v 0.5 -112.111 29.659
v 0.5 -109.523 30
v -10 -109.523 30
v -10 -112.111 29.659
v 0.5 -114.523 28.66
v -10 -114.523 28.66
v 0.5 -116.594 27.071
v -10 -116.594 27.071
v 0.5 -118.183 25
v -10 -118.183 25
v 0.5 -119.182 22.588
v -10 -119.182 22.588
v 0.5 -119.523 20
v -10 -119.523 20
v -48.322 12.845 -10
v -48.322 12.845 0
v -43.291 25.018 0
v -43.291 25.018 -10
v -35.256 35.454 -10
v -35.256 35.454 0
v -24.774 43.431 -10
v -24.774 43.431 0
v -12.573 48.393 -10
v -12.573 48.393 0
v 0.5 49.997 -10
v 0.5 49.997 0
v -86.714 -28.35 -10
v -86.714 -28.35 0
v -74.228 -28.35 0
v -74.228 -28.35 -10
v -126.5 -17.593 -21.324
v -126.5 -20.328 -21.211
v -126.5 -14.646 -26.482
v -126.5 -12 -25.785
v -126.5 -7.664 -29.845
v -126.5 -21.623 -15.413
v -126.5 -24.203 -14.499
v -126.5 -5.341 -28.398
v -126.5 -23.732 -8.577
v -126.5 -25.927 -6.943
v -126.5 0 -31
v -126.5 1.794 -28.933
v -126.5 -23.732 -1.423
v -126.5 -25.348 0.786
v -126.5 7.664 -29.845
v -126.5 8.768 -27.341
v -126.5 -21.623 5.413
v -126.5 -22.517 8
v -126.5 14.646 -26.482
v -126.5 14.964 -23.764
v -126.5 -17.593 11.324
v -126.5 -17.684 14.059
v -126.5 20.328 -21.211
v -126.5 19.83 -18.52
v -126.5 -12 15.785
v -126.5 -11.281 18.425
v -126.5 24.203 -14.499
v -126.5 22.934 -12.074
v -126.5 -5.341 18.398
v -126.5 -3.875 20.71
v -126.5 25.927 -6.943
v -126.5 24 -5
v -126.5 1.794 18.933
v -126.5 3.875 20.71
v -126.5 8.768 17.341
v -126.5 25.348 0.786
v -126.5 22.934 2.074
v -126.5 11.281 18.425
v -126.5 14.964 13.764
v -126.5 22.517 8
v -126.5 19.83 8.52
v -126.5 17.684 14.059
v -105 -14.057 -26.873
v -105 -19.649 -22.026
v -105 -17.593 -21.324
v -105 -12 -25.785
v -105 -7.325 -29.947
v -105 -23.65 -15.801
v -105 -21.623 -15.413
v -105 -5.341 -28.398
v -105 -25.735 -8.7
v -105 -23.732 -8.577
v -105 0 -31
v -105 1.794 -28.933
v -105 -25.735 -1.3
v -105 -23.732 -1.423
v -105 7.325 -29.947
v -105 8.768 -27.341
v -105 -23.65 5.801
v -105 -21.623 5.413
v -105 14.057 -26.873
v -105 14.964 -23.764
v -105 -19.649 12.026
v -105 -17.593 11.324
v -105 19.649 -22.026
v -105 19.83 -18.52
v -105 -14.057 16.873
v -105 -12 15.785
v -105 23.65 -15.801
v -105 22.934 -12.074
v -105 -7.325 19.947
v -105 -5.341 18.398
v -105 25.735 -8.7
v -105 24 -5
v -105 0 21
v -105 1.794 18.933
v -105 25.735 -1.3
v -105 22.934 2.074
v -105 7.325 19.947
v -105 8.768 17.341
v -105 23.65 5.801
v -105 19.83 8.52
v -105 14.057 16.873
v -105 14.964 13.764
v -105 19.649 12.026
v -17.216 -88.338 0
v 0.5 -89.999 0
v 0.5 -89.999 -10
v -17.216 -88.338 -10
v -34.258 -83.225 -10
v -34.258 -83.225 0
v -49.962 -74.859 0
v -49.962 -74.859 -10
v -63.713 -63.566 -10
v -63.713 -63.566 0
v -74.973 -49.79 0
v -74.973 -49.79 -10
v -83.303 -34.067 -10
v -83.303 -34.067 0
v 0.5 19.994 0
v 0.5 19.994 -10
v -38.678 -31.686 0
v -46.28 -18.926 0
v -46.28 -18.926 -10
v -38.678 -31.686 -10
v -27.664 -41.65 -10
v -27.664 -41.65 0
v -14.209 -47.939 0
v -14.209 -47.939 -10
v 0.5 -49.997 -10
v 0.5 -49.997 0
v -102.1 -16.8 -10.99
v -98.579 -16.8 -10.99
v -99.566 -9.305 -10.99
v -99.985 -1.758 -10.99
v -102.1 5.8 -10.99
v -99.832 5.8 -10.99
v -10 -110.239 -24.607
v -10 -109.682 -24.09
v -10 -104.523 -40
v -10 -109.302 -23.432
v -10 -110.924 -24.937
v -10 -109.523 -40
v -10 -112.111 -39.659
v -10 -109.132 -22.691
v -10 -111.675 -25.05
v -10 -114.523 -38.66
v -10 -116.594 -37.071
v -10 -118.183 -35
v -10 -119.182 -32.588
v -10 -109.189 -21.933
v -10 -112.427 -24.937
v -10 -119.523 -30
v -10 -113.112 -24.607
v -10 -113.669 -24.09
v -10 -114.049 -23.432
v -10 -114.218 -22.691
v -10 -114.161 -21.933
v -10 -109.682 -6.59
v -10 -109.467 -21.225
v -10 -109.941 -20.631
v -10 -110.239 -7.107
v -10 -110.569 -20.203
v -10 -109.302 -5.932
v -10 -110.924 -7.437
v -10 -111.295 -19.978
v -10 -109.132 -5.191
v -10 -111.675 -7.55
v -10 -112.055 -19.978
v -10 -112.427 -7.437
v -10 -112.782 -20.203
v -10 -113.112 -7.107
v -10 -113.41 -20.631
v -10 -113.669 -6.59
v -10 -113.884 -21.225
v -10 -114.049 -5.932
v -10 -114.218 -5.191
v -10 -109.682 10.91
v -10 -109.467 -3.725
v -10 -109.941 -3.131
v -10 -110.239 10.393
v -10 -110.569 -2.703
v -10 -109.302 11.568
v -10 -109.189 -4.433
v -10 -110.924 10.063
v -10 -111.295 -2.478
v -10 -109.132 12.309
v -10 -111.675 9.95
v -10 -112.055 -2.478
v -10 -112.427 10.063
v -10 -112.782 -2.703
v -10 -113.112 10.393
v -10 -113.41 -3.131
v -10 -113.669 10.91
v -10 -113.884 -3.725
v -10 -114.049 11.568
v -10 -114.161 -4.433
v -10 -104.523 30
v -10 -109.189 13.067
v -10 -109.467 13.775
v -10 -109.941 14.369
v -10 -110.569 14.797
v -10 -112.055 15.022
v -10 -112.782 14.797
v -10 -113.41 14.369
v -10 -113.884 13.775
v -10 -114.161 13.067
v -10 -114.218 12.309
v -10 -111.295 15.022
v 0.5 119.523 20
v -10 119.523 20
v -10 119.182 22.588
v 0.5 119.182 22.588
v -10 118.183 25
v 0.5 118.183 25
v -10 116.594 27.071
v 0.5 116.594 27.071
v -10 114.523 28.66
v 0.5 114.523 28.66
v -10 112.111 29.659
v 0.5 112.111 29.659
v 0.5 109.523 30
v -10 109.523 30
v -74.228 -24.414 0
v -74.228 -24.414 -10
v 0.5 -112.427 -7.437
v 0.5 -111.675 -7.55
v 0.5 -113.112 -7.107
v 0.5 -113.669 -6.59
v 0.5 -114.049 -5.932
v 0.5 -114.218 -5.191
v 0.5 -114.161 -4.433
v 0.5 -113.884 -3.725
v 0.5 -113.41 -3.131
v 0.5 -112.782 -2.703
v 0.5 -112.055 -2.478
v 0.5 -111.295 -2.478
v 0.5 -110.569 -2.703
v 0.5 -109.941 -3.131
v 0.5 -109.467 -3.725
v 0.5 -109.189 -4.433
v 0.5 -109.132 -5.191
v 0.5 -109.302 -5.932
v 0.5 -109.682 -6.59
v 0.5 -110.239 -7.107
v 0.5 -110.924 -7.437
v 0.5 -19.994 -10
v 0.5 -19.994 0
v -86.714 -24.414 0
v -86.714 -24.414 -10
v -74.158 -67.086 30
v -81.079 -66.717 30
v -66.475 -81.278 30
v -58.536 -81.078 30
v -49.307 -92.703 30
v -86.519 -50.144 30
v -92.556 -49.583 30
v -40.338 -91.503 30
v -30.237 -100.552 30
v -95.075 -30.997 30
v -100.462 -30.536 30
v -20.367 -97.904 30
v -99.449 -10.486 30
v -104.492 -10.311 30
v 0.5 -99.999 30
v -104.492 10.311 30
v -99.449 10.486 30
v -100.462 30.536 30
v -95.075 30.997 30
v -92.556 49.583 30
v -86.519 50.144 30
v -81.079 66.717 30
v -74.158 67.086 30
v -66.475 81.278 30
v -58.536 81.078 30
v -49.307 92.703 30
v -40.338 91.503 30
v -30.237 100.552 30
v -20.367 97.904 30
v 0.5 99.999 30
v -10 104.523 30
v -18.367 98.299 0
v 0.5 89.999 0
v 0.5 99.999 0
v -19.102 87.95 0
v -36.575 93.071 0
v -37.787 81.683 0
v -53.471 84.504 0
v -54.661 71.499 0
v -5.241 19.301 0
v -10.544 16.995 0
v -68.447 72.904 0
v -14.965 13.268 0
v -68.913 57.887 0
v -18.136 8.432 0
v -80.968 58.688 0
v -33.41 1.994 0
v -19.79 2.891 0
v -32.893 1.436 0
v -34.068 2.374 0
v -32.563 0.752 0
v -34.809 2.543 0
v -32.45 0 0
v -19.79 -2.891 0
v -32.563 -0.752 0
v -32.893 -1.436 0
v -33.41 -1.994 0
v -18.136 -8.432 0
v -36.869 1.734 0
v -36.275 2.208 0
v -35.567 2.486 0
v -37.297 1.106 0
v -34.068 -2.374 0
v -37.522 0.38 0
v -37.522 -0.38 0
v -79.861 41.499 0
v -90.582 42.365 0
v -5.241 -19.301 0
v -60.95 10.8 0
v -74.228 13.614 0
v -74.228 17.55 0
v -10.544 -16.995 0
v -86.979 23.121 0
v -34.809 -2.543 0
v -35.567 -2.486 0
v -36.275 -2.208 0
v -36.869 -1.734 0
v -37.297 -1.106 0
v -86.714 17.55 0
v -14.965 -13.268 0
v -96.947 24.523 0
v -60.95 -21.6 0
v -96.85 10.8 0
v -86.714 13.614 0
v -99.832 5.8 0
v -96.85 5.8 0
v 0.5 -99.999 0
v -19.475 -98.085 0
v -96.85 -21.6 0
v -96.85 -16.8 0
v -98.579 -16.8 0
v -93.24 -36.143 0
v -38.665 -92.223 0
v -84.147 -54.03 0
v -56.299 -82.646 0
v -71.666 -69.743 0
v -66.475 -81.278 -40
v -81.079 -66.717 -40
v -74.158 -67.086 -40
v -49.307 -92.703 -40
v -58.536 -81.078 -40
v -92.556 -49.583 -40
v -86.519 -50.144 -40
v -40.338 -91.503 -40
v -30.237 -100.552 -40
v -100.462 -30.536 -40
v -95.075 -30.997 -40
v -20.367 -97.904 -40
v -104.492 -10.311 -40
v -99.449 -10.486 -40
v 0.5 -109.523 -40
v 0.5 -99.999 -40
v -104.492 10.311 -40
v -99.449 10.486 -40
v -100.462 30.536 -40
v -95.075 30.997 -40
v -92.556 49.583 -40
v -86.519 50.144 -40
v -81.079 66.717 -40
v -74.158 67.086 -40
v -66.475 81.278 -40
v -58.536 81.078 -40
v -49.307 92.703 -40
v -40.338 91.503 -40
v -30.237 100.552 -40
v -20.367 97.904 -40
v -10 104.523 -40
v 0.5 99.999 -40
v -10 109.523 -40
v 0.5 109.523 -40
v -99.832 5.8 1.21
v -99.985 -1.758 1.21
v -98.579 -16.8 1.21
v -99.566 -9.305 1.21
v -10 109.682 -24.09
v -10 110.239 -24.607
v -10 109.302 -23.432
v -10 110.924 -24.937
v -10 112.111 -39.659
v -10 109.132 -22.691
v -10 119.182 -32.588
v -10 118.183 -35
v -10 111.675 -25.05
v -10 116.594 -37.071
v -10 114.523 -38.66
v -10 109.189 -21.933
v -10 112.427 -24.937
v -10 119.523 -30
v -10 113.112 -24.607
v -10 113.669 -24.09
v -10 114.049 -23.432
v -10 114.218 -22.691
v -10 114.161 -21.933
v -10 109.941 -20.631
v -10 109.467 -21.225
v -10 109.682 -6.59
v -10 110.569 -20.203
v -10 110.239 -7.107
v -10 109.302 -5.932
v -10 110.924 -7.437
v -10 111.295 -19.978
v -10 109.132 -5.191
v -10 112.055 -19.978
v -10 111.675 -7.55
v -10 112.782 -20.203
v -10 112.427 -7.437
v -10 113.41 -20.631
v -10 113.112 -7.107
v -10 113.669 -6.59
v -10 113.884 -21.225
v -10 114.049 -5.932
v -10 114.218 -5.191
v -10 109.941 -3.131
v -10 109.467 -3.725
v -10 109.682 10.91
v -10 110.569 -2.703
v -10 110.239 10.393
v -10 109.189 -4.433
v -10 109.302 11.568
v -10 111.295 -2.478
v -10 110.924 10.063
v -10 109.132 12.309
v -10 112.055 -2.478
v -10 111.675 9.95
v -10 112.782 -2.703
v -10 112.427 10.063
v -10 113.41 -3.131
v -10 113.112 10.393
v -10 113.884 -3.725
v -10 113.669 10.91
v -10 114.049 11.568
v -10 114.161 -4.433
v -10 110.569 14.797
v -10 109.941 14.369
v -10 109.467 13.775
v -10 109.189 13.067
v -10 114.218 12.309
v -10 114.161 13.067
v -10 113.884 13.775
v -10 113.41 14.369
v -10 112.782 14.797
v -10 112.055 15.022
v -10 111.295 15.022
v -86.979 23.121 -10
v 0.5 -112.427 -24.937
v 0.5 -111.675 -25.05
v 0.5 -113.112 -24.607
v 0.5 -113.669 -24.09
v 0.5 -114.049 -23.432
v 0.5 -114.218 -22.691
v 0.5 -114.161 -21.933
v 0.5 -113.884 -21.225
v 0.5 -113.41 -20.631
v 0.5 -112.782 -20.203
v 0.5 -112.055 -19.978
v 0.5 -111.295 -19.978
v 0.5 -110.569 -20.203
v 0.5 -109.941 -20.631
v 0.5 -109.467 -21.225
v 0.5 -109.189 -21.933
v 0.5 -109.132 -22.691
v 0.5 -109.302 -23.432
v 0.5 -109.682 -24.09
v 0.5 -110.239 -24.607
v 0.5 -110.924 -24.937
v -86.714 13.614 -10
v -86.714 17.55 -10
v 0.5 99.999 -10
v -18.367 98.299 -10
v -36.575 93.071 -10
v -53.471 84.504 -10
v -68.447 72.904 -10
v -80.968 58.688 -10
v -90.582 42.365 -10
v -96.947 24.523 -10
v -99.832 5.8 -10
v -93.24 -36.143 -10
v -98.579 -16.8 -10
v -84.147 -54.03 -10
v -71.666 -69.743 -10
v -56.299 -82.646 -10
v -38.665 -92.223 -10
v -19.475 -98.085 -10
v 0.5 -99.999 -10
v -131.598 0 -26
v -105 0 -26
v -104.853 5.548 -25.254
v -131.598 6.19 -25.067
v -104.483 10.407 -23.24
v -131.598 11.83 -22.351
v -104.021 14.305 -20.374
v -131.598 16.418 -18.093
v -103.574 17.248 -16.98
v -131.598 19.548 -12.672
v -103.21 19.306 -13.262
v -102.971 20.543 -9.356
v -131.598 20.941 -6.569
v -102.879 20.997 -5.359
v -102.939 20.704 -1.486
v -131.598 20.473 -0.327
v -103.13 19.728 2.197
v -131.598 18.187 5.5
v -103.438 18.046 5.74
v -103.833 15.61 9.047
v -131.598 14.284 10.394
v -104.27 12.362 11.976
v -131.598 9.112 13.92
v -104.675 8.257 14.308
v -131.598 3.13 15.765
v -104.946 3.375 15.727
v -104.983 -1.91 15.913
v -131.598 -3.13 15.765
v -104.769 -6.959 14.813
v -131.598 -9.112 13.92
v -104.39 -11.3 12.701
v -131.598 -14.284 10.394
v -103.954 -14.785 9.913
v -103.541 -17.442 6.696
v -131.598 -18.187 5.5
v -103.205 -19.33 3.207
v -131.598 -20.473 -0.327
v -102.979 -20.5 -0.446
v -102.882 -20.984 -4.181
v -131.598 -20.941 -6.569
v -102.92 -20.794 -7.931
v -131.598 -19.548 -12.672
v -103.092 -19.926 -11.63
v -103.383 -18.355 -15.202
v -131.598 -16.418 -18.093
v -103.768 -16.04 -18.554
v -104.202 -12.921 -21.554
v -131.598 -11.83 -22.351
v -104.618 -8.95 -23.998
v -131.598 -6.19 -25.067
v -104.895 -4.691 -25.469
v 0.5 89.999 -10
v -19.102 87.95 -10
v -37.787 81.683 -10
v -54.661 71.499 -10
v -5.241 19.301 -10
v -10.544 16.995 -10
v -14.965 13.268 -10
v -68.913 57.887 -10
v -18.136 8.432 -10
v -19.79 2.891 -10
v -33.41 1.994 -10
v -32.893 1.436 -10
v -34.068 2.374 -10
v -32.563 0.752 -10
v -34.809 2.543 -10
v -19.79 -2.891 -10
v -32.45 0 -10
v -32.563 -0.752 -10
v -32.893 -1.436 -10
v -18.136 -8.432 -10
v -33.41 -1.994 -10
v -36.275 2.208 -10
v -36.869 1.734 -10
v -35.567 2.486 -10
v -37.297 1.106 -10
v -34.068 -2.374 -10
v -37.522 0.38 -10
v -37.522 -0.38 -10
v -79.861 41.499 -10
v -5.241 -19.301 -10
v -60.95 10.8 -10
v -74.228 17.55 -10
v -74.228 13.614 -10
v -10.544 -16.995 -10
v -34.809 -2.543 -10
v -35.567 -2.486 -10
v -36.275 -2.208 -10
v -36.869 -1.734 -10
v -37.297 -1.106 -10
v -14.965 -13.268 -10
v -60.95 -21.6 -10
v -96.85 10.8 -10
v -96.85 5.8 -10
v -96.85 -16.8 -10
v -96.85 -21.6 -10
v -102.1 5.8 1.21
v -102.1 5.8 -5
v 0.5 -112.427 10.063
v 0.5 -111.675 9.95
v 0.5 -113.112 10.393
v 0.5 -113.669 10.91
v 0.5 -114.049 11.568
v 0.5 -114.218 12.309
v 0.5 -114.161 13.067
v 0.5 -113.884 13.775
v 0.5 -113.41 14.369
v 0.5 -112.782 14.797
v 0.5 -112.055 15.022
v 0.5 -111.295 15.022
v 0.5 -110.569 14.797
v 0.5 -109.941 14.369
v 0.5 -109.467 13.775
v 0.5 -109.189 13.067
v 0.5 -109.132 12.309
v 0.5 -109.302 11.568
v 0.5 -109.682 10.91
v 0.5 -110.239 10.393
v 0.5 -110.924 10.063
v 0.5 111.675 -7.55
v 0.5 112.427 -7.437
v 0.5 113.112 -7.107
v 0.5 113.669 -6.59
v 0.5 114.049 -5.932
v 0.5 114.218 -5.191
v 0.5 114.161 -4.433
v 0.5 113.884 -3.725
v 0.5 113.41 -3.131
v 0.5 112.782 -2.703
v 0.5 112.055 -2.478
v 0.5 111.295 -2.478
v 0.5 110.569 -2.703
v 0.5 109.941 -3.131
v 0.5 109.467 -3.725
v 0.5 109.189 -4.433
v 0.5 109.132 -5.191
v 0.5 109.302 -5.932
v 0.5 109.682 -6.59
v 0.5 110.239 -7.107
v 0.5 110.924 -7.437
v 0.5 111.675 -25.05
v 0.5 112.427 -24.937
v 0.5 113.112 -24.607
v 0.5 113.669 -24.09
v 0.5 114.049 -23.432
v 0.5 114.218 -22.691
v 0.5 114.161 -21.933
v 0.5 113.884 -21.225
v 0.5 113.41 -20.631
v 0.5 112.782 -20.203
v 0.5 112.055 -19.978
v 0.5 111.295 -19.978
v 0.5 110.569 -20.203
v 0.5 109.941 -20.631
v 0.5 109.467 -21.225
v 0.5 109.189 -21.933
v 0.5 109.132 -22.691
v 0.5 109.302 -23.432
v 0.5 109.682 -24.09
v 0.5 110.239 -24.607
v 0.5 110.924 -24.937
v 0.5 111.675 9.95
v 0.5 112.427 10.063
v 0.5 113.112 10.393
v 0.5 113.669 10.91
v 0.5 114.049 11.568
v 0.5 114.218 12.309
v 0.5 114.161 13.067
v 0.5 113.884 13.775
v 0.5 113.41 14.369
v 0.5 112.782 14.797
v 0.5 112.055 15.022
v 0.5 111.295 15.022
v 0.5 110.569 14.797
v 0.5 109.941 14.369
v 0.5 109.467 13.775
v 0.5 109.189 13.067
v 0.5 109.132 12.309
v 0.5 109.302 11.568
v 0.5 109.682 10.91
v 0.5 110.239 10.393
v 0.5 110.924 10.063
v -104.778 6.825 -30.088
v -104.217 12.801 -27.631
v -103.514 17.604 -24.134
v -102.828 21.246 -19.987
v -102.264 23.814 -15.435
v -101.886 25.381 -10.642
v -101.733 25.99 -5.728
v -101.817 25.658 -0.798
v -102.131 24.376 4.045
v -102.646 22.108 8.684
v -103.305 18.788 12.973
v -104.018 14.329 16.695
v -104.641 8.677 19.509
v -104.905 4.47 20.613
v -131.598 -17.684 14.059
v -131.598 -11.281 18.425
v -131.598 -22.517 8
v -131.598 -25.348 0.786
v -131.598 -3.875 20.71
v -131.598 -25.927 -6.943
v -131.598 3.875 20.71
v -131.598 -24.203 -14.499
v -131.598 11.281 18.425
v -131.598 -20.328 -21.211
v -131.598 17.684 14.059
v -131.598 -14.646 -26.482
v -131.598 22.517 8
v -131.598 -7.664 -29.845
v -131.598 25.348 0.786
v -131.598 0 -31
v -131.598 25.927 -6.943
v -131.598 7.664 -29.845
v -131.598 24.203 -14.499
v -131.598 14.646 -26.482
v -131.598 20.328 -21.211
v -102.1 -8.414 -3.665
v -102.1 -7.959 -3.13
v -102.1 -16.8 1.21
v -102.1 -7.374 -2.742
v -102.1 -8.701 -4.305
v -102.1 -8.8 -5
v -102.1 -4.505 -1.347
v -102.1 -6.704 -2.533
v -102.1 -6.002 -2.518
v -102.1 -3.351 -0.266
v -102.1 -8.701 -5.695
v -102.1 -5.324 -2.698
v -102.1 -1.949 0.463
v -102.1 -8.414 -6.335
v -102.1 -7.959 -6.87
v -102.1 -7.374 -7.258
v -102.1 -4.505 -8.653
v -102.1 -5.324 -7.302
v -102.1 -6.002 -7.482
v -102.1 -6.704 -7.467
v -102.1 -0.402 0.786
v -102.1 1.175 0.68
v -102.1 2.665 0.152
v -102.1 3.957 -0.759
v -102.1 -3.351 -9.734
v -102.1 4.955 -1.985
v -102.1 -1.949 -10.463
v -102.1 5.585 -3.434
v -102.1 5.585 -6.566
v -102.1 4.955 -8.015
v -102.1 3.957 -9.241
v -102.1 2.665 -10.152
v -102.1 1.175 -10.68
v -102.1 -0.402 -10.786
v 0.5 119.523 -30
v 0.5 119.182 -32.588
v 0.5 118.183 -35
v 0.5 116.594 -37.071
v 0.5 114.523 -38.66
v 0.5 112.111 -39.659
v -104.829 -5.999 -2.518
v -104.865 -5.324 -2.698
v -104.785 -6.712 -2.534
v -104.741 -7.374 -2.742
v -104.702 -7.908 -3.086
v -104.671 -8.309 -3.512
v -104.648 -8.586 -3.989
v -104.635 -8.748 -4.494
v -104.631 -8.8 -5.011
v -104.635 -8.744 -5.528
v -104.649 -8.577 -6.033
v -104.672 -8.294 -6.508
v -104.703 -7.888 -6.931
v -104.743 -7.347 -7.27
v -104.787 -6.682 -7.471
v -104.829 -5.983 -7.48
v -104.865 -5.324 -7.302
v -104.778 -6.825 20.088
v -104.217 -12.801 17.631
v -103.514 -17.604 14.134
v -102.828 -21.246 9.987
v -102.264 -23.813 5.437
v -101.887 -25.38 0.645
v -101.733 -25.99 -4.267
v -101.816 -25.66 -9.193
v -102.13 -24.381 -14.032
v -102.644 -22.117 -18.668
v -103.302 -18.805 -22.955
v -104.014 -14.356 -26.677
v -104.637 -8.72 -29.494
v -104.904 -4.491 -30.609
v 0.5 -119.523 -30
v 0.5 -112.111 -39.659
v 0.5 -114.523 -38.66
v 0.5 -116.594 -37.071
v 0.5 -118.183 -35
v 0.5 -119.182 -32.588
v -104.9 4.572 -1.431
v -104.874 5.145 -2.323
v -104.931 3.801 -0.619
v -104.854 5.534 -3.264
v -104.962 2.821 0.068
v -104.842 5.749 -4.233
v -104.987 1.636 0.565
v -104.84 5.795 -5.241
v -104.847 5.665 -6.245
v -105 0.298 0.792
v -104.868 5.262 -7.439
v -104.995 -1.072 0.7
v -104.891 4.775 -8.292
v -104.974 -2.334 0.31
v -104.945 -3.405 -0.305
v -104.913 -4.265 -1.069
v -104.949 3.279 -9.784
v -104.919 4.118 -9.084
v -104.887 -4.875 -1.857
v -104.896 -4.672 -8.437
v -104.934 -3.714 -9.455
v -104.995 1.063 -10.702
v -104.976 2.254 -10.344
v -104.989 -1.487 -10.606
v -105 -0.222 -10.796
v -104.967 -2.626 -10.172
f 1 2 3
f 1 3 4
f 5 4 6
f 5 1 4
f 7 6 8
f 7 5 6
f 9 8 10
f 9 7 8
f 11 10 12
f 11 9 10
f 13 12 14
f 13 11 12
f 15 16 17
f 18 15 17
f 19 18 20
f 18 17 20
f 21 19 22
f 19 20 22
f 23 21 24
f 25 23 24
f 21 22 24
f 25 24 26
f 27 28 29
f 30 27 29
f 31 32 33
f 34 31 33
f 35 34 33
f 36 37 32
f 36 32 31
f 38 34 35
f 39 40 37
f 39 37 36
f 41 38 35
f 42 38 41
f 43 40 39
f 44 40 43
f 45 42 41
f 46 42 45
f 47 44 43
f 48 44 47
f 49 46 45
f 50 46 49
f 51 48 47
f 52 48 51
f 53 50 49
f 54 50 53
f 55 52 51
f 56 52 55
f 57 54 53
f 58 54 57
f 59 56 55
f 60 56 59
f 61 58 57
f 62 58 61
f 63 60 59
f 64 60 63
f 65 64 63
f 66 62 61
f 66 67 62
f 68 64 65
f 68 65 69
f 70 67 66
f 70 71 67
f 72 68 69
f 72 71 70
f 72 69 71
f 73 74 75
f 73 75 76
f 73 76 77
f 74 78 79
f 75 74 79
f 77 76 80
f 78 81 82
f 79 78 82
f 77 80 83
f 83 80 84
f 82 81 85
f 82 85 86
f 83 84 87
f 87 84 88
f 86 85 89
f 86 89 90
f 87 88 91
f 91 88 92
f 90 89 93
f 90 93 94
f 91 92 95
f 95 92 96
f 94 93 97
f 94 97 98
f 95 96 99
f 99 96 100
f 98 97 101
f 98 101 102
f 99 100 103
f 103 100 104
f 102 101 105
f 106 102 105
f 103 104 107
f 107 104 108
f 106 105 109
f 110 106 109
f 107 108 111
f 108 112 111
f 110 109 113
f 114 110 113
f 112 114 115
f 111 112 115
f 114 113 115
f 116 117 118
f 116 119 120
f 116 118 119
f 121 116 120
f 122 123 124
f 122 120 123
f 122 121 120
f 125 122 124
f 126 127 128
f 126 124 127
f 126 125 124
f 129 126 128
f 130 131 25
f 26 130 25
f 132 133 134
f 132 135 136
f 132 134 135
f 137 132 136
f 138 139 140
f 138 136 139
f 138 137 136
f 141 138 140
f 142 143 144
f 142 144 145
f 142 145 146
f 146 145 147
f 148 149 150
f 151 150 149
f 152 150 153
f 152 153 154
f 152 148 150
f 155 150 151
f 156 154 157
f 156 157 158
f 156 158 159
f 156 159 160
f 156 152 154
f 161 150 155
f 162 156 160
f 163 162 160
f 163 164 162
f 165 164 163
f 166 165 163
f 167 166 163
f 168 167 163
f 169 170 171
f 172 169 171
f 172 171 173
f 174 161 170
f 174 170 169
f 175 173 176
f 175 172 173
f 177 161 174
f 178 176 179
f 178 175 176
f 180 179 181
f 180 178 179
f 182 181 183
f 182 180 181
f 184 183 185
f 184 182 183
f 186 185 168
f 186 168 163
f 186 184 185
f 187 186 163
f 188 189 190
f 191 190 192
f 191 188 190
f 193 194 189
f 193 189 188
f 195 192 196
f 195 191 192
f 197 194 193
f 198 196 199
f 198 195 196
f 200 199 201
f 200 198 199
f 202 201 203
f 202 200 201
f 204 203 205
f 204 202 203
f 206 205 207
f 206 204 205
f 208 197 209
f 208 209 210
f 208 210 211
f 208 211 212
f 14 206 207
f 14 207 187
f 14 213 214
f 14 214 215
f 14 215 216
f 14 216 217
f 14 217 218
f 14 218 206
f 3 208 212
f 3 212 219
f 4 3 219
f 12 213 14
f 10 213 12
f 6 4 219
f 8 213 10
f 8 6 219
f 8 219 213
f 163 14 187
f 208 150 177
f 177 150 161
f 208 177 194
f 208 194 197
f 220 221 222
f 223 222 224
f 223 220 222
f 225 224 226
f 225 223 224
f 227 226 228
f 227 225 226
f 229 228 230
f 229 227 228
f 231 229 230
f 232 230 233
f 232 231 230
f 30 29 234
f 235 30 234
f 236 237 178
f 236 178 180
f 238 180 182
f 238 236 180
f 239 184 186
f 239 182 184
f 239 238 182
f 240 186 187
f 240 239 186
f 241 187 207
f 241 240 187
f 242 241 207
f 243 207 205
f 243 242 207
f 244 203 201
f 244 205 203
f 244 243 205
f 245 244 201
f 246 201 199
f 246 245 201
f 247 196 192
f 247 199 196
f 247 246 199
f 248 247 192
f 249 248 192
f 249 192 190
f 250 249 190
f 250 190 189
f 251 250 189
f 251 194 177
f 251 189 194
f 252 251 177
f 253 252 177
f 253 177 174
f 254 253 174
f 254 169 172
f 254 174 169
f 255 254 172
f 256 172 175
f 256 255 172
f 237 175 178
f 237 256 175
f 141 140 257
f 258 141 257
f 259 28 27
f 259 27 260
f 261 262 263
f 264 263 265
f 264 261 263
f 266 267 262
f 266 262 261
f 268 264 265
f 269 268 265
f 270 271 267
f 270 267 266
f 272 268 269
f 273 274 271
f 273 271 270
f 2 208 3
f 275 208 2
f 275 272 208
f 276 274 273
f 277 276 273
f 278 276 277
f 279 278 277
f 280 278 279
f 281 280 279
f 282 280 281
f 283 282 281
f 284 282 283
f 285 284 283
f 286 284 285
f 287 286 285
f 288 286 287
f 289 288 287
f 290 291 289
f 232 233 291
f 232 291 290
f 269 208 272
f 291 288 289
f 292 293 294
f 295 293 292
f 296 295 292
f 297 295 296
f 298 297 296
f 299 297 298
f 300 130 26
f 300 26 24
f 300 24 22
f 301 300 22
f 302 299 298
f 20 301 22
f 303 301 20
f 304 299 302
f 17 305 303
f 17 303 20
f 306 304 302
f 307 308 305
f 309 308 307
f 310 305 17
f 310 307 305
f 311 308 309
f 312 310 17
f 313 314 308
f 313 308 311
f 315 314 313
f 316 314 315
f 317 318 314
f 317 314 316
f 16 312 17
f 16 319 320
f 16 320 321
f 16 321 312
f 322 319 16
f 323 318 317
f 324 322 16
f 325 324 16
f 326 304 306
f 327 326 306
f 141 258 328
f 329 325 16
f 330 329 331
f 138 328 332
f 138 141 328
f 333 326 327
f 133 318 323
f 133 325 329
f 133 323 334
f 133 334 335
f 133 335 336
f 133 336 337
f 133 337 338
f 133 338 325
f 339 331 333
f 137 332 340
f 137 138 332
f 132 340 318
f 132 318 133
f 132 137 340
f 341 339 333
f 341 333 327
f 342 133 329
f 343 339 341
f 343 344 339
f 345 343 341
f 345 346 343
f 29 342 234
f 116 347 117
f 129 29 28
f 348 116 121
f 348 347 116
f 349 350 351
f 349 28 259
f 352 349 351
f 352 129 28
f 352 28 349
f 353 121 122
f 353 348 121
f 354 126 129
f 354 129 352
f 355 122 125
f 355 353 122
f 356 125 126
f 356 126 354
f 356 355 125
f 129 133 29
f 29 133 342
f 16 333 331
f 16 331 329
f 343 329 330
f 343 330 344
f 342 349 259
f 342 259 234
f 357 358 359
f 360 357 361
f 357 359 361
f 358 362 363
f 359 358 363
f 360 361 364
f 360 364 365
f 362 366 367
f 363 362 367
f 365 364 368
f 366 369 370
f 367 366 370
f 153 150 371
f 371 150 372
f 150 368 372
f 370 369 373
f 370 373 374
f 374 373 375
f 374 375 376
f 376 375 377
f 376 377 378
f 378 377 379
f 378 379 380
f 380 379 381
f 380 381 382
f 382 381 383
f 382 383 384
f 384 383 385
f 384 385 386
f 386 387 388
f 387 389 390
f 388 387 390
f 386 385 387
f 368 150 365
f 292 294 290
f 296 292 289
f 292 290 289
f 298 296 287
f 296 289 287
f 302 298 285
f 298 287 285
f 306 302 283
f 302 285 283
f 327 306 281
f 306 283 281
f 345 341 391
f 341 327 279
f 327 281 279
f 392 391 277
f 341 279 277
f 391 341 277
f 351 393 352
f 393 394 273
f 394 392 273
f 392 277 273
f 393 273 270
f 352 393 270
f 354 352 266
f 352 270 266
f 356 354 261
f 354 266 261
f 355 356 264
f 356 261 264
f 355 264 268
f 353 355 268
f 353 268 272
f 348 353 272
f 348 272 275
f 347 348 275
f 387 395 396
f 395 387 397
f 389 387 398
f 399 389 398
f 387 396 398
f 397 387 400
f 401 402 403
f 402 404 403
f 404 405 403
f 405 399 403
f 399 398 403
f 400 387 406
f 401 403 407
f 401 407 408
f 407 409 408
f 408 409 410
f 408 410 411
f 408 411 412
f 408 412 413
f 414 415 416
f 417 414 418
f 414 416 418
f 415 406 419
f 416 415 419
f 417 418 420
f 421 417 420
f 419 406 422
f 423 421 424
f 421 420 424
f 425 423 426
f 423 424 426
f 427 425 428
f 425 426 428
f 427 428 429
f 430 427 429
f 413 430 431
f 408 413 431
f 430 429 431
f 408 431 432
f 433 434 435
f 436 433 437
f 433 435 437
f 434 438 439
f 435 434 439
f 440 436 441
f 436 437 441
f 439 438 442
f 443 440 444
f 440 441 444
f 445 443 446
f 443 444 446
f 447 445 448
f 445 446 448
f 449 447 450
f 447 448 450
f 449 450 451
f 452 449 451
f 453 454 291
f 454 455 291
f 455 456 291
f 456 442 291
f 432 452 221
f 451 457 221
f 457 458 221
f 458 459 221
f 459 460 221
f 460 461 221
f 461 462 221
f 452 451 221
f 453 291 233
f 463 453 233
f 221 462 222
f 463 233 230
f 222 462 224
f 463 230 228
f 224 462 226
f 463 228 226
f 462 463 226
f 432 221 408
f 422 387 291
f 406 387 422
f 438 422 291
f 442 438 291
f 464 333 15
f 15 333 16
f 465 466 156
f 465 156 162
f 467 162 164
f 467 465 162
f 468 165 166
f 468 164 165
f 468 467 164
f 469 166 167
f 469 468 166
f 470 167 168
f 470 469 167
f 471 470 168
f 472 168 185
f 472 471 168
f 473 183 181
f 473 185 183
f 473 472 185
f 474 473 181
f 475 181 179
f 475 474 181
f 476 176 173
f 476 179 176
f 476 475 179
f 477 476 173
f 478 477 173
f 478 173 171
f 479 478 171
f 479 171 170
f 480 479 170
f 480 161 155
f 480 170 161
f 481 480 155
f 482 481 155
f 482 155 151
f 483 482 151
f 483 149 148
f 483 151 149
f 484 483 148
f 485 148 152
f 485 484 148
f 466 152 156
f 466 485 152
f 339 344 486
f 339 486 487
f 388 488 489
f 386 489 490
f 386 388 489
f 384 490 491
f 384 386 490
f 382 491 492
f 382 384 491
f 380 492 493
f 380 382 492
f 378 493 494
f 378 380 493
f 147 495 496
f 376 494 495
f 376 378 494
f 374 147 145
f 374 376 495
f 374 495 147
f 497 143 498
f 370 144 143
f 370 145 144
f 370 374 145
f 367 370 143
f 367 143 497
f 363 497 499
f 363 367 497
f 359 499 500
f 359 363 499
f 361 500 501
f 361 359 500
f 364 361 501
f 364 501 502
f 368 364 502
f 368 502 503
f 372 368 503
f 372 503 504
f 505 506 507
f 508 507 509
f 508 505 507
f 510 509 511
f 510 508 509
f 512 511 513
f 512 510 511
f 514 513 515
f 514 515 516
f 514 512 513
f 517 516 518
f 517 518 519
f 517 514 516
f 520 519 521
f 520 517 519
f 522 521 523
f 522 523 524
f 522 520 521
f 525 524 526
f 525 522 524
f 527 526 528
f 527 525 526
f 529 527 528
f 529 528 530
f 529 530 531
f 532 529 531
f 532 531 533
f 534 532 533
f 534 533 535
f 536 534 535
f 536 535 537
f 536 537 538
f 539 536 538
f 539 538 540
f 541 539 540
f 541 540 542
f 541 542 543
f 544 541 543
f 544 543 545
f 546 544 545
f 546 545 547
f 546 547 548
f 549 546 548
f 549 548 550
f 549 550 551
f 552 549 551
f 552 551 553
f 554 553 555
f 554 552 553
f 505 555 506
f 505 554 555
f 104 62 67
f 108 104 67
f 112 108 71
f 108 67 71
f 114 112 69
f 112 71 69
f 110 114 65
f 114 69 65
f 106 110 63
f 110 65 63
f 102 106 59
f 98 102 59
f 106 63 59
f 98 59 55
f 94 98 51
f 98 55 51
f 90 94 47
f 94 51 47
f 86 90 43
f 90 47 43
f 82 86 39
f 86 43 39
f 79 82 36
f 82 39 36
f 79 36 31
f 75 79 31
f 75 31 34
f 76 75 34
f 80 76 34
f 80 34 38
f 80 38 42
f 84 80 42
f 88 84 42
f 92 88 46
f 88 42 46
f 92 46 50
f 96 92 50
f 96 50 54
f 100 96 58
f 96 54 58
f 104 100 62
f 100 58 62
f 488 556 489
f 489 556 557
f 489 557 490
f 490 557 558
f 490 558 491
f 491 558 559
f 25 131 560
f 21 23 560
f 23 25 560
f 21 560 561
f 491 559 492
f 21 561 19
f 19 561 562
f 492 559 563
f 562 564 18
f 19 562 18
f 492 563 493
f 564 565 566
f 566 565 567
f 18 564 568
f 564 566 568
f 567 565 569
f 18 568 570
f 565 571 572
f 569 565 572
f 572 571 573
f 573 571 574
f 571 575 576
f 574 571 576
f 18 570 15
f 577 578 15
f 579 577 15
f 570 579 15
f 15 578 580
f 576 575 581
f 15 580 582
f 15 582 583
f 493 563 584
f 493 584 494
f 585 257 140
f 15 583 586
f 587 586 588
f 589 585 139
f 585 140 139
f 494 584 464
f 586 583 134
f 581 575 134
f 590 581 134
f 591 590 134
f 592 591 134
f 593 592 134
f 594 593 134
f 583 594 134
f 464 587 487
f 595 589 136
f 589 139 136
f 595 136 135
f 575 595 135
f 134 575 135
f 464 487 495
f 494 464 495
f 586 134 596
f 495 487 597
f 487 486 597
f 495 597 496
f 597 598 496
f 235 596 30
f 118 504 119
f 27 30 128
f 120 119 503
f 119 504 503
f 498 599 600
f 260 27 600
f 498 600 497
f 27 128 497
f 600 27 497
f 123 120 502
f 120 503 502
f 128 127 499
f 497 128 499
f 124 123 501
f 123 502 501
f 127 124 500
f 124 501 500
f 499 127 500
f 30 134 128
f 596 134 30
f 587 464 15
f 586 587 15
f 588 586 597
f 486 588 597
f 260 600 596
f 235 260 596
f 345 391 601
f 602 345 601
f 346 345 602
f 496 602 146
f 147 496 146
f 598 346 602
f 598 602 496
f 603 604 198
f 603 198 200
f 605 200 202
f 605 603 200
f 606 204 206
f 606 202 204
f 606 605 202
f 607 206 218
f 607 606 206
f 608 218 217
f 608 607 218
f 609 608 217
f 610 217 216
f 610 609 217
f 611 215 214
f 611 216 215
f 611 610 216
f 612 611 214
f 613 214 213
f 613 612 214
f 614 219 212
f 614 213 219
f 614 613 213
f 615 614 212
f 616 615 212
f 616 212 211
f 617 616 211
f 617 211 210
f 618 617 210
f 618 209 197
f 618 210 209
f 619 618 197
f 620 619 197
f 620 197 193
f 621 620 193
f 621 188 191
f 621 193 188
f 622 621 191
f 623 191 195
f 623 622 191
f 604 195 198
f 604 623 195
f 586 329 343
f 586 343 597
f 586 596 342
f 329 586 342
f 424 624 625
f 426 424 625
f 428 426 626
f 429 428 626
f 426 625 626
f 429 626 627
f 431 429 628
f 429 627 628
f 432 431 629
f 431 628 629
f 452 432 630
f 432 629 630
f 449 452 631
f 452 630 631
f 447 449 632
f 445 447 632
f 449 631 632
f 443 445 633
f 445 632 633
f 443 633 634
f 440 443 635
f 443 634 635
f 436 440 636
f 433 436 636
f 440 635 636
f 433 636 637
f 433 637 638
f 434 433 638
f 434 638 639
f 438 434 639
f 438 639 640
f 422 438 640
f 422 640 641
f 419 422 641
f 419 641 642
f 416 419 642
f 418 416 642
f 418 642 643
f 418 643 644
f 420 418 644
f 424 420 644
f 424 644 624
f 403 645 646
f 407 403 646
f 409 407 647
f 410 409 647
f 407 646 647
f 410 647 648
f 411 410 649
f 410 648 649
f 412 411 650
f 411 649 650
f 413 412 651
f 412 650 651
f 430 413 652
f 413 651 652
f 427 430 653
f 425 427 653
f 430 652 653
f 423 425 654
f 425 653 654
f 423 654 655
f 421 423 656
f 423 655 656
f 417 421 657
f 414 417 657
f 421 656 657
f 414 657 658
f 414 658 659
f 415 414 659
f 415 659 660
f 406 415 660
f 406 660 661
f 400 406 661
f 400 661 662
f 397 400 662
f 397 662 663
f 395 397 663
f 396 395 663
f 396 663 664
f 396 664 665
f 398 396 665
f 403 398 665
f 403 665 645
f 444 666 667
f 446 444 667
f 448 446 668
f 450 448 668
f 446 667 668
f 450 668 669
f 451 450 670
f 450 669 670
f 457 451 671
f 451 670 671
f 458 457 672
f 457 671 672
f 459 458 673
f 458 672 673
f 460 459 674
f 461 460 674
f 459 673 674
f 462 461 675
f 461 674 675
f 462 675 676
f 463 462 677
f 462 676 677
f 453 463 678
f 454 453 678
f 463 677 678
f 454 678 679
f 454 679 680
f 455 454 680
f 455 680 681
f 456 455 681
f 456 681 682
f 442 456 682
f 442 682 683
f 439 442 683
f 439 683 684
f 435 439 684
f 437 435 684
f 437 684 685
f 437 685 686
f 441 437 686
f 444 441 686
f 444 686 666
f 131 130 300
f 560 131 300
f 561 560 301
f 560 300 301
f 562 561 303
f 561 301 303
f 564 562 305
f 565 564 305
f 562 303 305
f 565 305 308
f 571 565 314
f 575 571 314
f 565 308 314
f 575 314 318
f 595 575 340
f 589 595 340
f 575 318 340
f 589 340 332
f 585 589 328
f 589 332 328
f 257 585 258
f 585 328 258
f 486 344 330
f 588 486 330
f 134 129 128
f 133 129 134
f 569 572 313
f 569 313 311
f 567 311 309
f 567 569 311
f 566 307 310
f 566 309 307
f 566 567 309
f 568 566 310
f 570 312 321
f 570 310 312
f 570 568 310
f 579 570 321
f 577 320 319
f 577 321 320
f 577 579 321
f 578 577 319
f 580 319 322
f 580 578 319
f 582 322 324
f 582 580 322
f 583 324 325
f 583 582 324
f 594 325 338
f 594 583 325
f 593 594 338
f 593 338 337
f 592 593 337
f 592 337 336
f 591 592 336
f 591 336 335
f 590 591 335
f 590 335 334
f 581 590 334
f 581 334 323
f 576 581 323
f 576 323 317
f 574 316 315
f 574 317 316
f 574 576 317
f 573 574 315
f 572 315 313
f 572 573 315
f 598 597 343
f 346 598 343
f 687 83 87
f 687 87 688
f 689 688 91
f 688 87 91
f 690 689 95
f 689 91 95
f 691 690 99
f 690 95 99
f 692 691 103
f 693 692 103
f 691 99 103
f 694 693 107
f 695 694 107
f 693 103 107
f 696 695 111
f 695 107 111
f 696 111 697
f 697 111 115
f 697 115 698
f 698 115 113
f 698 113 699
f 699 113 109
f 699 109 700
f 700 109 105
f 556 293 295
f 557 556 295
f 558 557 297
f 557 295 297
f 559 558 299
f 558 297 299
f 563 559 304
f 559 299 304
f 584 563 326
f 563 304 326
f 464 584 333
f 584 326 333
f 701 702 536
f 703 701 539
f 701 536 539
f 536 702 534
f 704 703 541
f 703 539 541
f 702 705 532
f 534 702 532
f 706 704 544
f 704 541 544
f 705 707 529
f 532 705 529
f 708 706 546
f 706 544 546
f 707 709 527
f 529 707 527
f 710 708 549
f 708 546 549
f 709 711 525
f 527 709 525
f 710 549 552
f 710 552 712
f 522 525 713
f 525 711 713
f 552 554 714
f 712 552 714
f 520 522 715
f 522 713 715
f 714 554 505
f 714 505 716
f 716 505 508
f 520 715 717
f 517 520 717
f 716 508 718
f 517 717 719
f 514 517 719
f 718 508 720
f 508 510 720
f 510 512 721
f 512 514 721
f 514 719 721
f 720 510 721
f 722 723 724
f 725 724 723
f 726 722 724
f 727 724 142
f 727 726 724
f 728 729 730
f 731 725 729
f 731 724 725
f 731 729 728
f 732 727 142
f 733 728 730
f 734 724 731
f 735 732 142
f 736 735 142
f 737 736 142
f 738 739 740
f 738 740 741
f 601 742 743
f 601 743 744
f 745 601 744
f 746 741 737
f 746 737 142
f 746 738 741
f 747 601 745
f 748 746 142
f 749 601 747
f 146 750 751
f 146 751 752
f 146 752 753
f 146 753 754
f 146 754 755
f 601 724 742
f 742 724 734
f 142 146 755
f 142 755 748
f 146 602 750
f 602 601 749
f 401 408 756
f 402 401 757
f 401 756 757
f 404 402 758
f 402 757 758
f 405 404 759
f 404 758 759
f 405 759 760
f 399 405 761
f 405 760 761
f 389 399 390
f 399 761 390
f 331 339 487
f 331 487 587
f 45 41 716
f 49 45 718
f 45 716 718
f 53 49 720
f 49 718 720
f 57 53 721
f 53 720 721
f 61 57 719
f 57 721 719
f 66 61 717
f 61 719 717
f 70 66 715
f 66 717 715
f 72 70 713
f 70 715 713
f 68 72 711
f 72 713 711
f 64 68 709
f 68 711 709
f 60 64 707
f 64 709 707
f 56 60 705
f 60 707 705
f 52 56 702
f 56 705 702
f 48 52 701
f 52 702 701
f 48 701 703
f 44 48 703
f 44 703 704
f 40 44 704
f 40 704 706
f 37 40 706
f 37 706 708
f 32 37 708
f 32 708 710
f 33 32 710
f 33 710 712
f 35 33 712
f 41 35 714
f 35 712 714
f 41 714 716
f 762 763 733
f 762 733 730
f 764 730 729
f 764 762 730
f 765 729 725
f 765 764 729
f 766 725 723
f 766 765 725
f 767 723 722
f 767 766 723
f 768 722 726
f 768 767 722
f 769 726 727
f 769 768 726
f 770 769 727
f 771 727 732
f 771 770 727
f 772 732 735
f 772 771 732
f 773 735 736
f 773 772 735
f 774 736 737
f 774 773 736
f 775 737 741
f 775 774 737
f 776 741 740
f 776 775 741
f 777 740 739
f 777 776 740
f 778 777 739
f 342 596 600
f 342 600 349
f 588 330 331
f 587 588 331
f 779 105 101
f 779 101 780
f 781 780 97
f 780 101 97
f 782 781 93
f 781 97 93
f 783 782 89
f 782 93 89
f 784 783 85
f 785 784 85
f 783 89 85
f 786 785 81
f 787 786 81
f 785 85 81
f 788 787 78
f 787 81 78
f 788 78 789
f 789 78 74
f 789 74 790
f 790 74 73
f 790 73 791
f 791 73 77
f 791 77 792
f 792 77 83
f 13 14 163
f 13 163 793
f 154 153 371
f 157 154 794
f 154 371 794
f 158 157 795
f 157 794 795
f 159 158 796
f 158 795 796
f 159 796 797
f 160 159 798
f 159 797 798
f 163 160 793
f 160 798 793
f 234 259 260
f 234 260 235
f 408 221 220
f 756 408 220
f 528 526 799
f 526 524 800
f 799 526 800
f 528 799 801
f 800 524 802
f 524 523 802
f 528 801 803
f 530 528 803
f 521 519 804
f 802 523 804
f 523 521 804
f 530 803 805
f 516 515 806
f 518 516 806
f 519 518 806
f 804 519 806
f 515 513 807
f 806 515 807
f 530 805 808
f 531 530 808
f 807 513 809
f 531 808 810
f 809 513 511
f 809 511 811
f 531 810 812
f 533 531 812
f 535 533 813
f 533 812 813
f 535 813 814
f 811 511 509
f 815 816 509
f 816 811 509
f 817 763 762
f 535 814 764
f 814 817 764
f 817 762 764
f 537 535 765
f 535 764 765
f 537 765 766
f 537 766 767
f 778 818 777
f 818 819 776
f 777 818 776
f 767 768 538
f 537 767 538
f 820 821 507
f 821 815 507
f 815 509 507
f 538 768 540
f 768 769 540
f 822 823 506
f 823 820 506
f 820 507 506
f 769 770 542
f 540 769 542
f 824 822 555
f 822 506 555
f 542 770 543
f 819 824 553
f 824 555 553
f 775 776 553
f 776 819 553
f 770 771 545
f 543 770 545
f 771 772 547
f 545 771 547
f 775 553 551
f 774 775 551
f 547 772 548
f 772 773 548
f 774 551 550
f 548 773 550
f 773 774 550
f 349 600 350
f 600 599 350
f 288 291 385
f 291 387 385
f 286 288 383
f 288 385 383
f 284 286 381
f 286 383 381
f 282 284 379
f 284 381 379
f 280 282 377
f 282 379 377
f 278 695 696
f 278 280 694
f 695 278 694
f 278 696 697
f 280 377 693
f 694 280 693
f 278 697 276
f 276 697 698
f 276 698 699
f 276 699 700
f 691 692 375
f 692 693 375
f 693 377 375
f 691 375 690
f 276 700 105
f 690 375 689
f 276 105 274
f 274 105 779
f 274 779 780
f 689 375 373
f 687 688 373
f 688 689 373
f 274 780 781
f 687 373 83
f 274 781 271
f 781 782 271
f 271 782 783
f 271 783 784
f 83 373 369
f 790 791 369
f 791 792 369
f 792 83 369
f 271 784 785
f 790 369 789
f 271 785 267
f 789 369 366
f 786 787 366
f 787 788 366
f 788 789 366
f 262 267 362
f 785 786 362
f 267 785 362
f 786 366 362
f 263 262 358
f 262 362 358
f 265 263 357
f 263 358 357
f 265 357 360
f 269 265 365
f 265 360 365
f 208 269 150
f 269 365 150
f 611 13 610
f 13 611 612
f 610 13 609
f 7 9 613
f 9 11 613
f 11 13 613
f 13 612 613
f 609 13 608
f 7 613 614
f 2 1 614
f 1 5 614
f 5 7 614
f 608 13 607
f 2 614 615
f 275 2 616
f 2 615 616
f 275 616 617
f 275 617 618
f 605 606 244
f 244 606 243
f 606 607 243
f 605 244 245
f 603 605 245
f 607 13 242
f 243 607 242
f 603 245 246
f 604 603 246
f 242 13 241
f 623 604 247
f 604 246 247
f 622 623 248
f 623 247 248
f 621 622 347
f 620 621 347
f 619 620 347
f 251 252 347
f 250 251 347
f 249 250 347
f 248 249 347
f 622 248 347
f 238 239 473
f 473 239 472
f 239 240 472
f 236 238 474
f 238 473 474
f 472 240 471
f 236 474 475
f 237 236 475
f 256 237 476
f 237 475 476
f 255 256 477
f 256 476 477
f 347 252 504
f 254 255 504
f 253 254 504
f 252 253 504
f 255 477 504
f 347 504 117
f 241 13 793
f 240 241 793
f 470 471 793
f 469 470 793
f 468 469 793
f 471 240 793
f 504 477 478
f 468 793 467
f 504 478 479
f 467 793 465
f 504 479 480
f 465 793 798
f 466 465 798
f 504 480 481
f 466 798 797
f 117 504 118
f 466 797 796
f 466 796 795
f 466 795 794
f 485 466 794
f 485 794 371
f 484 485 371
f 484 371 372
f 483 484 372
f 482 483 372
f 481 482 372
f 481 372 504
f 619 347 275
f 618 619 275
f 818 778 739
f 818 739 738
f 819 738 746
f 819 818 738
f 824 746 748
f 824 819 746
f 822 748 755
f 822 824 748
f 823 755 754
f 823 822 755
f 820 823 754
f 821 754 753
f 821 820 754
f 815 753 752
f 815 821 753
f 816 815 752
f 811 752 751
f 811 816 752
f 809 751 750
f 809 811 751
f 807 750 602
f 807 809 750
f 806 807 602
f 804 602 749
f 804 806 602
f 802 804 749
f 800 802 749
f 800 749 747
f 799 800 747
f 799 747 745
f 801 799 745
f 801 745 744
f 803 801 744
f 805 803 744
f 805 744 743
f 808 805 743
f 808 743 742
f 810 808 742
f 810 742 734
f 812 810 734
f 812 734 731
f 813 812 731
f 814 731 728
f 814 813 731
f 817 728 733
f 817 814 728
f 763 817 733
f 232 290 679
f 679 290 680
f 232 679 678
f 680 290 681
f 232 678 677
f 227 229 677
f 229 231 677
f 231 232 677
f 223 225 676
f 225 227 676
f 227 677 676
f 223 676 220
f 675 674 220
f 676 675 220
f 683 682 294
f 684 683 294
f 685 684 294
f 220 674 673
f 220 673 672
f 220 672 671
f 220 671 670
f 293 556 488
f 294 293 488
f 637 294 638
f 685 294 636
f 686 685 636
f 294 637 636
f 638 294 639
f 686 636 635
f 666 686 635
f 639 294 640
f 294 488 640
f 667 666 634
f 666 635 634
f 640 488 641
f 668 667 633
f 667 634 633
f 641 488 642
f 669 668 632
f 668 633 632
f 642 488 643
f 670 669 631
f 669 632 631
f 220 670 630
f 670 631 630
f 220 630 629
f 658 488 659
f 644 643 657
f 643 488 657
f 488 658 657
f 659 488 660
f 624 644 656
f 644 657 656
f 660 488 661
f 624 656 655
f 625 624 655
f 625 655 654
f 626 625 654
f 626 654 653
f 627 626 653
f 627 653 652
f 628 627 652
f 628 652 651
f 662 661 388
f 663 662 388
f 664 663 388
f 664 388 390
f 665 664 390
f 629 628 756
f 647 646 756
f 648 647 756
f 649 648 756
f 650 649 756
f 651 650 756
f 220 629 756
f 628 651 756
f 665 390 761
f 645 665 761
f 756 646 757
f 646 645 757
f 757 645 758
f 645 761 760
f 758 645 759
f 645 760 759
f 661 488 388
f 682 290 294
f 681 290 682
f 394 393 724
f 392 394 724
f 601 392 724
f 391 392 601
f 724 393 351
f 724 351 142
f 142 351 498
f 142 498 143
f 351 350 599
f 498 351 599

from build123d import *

# Parameters (mm, degrees)
SKETCH_1_W                = 105
SKETCH_1_H                = 10
EXTRUDE_3_DEPTH           = 10
EXTRUDE_3_DEPTH_BACK      = 20
SKETCH_11_R               = 105
SKETCH_11_R_2             = 100
EXTRUDE_START             = 20
SKETCH_12_R               = 105
SKETCH_12_R_2             = 100
EXTRUDE_4_DEPTH           = 20
SKETCH_4_R                = 25.5
SKETCH_4_R_2              = 20.5
EXTRUDE_6_DEPTH           = 20
EXTRUDE_START_2           = -31.598350223
EXTRUDE_7_OUTLINE_R       = 26
EXTRUDE_7_OUTLINE_R_2     = 21
EXTRUDE_7_DEPTH           = 30.598350223
SKETCH_6_R                = 20
CUT_EXTRUDE_1_DEPTH       = 174.040821302
CUT_EXTRUDE_8_DEPTH       = 10
CUT_EXTRUDE_START         = -4.05
SKETCH_17_W               = 12.2
SKETCH_17_H               = 22.6
CUT_EXTRUDE_9_DEPTH       = 6.15
CUT_EXTRUDE_START_2       = -35
CUT_EXTRUDE_10_DEPTH      = 35.9
SKETCH_21_W               = 12.48598734
SKETCH_21_H               = 3.935393954
CUT_EXTRUDE_11_DEPTH      = 174.040821302
SKETCH_23_W               = 21.5
SKETCH_23_H               = 4
MIRROR_START              = -126.5
MIRROR_3_OUTLINE_R        = 26
MIRROR_3_OUTLINE_R_2      = 24
MIRROR_3_DEPTH            = 21.5
SKETCH_24_R               = 20
CUT_EXTRUDE_12_DEPTH      = 174.040821302
SKETCH_25_W               = 5.25
SKETCH_25_H               = 10
CUT_EXTRUDE_13_DEPTH      = 1
EXTRUDE_8_DEPTH           = 35
FILLET_1_R                = 10
FILLET_1_OF_MIRROR_4_R    = 10
M5X0_8_1_D                = 4.2
SKETCH_38_R               = 2.55
CUT_EXTRUDE_17_DEPTH      = 190.567335177
M5X0_8_2_D                = 4.2
CUT_EXTRUDE_18_DEPTH      = 183.219119633
CUT_EXTRUDE_18_DEPTH_BACK = 183.219119633
SKETCH_39_R               = 2.55
CUT_EXTRUDE_14_DEPTH      = 183.219119633
CUT_EXTRUDE_14_DEPTH_BACK = 183.219119633
SKETCH_34_W               = 208.658629851
SKETCH_34_H               = 276.195432186


with BuildPart() as part:
    # 草图1 → 旋转1 (revolve)
    with BuildSketch(Plane(origin=(0, 0, 0), x_dir=(1, 0, 0), z_dir=(0, 1, 0))):
        with Locations((52.5, 5)):
            Rectangle(SKETCH_1_W, SKETCH_1_H)
    revolve(axis=Axis((0, 0, 0), (0, 0, -1)))

    # 草图11 → 凸台-拉伸3 (add, two sides: drawn at the far end of the back side and taken through both)
    with BuildSketch(Plane.XY.offset(-EXTRUDE_3_DEPTH_BACK)):
        Circle(SKETCH_11_R)
        Circle(SKETCH_11_R_2, mode=Mode.SUBTRACT)
    extrude(amount=EXTRUDE_3_DEPTH + EXTRUDE_3_DEPTH_BACK)

    # 草图12 → 凸台-拉伸4 (add)
    with BuildSketch(Plane.XY.offset(10).offset(EXTRUDE_START)):
        Circle(SKETCH_12_R)
        Circle(SKETCH_12_R_2, mode=Mode.SUBTRACT)
    extrude_4 = extrude(amount=-EXTRUDE_4_DEPTH)

    # 镜向1: 凸台-拉伸4 across plane
    add(extrude_4.mirror(Plane.XY.offset(-5)))

    # 草图4 → 凸台-拉伸6 (add)
    with BuildSketch(Plane(origin=(100, 0, 0), x_dir=(0, 0, -1), z_dir=(1, 0, 0))):
        with Locations((5, 0)):
            Circle(SKETCH_4_R)
        with Locations((5, 0)):
            Circle(SKETCH_4_R_2, mode=Mode.SUBTRACT)
    extrude(amount=EXTRUDE_6_DEPTH)

    # 凸台-拉伸7: read off the stored shape, not the designer's step
    # 凸台-拉伸7 outline → 凸台-拉伸7 (add)
    with BuildSketch(Plane(origin=(-100, 0, 0), x_dir=(0, 0, -1), z_dir=(1, 0, 0)).offset(EXTRUDE_START_2)):
        with Locations((5, 0)):
            Circle(EXTRUDE_7_OUTLINE_R)
        with Locations((5, 0)):
            Circle(EXTRUDE_7_OUTLINE_R_2, mode=Mode.SUBTRACT)
    extrude(amount=EXTRUDE_7_DEPTH)

    # 草图6 → 切除-拉伸1 (cut, through all)
    with BuildSketch(Plane.XY):
        with Locations((0, -70)):
            Circle(SKETCH_6_R)
        with Locations(Location((0, 70, 0), (0, 0, 180))):
            Circle(SKETCH_6_R)
    extrude(amount=-CUT_EXTRUDE_1_DEPTH, mode=Mode.SUBTRACT)

    # 草图16 → 切除-拉伸8 (cut)
    with BuildSketch(Plane(origin=(105, 0, 0), x_dir=(0, 0, -1), z_dir=(1, 0, 0))):
        with BuildLine():
            ThreePointArc((7.301532566, -5.323809524), (5, 5.8), (2.698467434, -5.323809524))
            ThreePointArc((2.698467434, -5.323809524), (5, -8.8), (7.301532566, -5.323809524))
        make_face()
    cut_extrude_8 = extrude(amount=-CUT_EXTRUDE_8_DEPTH, mode=Mode.SUBTRACT)

    # 草图17 → 切除-拉伸9 (cut)
    with BuildSketch(Plane(origin=(100, 0, 0), x_dir=(0, 0, -1), z_dir=(1, 0, 0)).offset(CUT_EXTRUDE_START)):
        with Locations((4.890474786, -5.5)):
            Rectangle(SKETCH_17_W, SKETCH_17_H)
    cut_extrude_9 = extrude(amount=CUT_EXTRUDE_9_DEPTH, mode=Mode.SUBTRACT)

    # 草图19 → 切除-拉伸10 (cut)
    with BuildSketch(Plane(origin=(95.95, 0, 0), x_dir=(0, 0, -1), z_dir=(1, 0, 0)).offset(CUT_EXTRUDE_START_2)):
        Polygon((-1.122566441, -16.8), (-1.122566441, 5.8), (-1.122566441, 10.8), (11.077433559, 10.8), (11.077433559, 5.8), (11.077433559, -16.8), (11.077433559, -21.6), (-1.122566441, -21.6), align=None)
    cut_extrude_10 = extrude(amount=CUT_EXTRUDE_10_DEPTH, mode=Mode.SUBTRACT)

    # 镜向2: 切除-拉伸8, 切除-拉伸9, 切除-拉伸10 across plane
    add(cut_extrude_8.mirror(Plane(origin=(0, 0, 0), x_dir=(0, 0, 1), z_dir=(1, 0, 0))), mode=Mode.SUBTRACT)
    add(cut_extrude_9.mirror(Plane(origin=(0, 0, 0), x_dir=(0, 0, 1), z_dir=(1, 0, 0))), mode=Mode.SUBTRACT)
    add(cut_extrude_10.mirror(Plane(origin=(0, 0, 0), x_dir=(0, 0, 1), z_dir=(1, 0, 0))), mode=Mode.SUBTRACT)

    # 草图21 → 切除-拉伸11 (cut, through all)
    with BuildSketch(Plane.XY):
        with Locations((-80.471231892, 15.58208287)):
            Rectangle(SKETCH_21_W, SKETCH_21_H)
        with Locations((-80.471231892, -26.38208287)):
            Rectangle(SKETCH_21_W, SKETCH_21_H)
        with Locations((80.471231892, -26.38208287)):
            Rectangle(SKETCH_21_W, SKETCH_21_H)
        with Locations((80.471231892, 15.58208287)):
            Rectangle(SKETCH_21_W, SKETCH_21_H)
    extrude(amount=-CUT_EXTRUDE_11_DEPTH, mode=Mode.SUBTRACT)

    # 草图23 → 切除-旋转1 (revolve, cut)
    with BuildSketch(Plane.XY.offset(-5), mode=Mode.PRIVATE) as cut_revolve_1_sk:
        with Locations((115.75, 26)):
            Rectangle(SKETCH_23_W, SKETCH_23_H)
    revolve(cut_revolve_1_sk.sketch.rotate(Axis((120, 0, -5), (-1, 0, 0)), 90), axis=Axis((120, 0, -5), (-1, 0, 0)), mode=Mode.SUBTRACT)

    # 镜向3: read off the stored shape, not the designer's step
    # 镜向3 outline → 镜向3 (cut)
    with BuildSketch(Plane.YZ.offset(MIRROR_START)):
        with Locations((0, -5)):
            Circle(MIRROR_3_OUTLINE_R)
        with Locations((0, -5)):
            Circle(MIRROR_3_OUTLINE_R_2, mode=Mode.SUBTRACT)
    extrude(amount=MIRROR_3_DEPTH, mode=Mode.SUBTRACT)

    # 草图24 → 切除-拉伸12 (cut, through all)
    with BuildSketch(Plane.XY):
        Circle(SKETCH_24_R)
        with BuildLine():
            Line((-86.979425588, 23.120975852), (-48.321903105, 12.844986584))
            ThreePointArc((-48.321903105, 12.844986584), (0, 50), (48.321903105, 12.844986584))
            Line((48.321903105, 12.844986584), (86.979425588, 23.120975852))
            ThreePointArc((86.979425588, 23.120975852), (0, 90), (-86.979425588, 23.120975852))
        make_face()
        with BuildLine():
            Line((46.279615655, -18.926097718), (83.303308179, -34.066975893))
            ThreePointArc((83.303308179, -34.066975893), (0, -90), (-83.303308179, -34.066975893))
            Line((-83.303308179, -34.066975893), (-46.279615655, -18.926097718))
            ThreePointArc((-46.279615655, -18.926097718), (0, -50), (46.279615655, -18.926097718))
        make_face()
    extrude(amount=-CUT_EXTRUDE_12_DEPTH, mode=Mode.SUBTRACT)

    # 草图25 → 切除-拉伸13 (cut)
    with BuildSketch(Plane.XZ.offset(-5.8)):
        with Locations((99.475, -5)):
            Rectangle(SKETCH_25_W, SKETCH_25_H)
    extrude(amount=-CUT_EXTRUDE_13_DEPTH, mode=Mode.SUBTRACT)

    # 草图26 → 凸台-拉伸8 (add, symmetric)
    with BuildSketch(Plane.XY.offset(-5)):
        with BuildLine():
            Line((-10, 104.522724802), (-10, 119.522724802))
            Line((-10, 119.522724802), (10, 119.522724802))
            Line((10, 119.522724802), (10, 104.522724802))
            ThreePointArc((10, 104.522724802), (0, 105), (-10, 104.522724802))
        make_face()
    extrude_8 = extrude(amount=EXTRUDE_8_DEPTH, both=True)

    # 圆角1
    fillet_1_edges = [part.edges().sort_by_distance(p)[0] for p in [
        (0, 119.522724802, -40),
        (0, 119.522724802, 30),
    ]]
    fillet(fillet_1_edges, radius=FILLET_1_R)

    # 镜向4: 凸台-拉伸8 across plane
    add(extrude_8.mirror(Plane.ZX))

    # 圆角1 of 镜向4
    fillet_1_of_mirror_4_edges = [part.edges().sort_by_distance(p)[0] for p in [
        (0, -119.522724802, -40),
        (0, -119.522724802, 30),
    ]]
    fillet(fillet_1_of_mirror_4_edges, radius=FILLET_1_OF_MIRROR_4_R)

    # M5x0.8 螺纹孔1 (through all)
    with Locations(Plane(origin=(10, 0, 0), x_dir=(0, 0, -1), z_dir=(1, 0, 0))):
        with Locations((-12.5, 111.675356556), (5, 111.675356556), (22.5, 111.675356556)):
            m5x0_8_1 = Hole(M5X0_8_1_D / 2)

    # 草图38 → 切除-拉伸17 (cut, through all)
    with BuildSketch(Plane(origin=(10, 0, 0), x_dir=(0, 0, -1), z_dir=(1, 0, 0))):
        with Locations((-12.5, 111.675356556)):
            Circle(SKETCH_38_R)
        with Locations((5, 111.675356556)):
            Circle(SKETCH_38_R)
        with Locations((22.5, 111.675356556)):
            Circle(SKETCH_38_R)
    cut_extrude_17 = extrude(amount=-CUT_EXTRUDE_17_DEPTH, mode=Mode.SUBTRACT)

    # 镜向5: M5x0.8 螺纹孔1, 切除-拉伸17 across plane
    add(m5x0_8_1.mirror(Plane.ZX), mode=Mode.SUBTRACT)
    add(cut_extrude_17.mirror(Plane.ZX), mode=Mode.SUBTRACT)

    # M5x0.8 螺纹孔2 (through all)
    with Locations(Plane.XY):
        with Locations((-35, 0), (35, 0)):
            Hole(M5X0_8_2_D / 2)

    # 草图39 → 切除-拉伸18 (cut, two sides: drawn at the far end of the back side and taken through both)
    with BuildSketch(Plane.XY.offset(-CUT_EXTRUDE_18_DEPTH_BACK)):
        with Locations((-35, 0)):
            Circle(SKETCH_39_R)
        with Locations((35, 0)):
            Circle(SKETCH_39_R)
    extrude(amount=CUT_EXTRUDE_18_DEPTH + CUT_EXTRUDE_18_DEPTH_BACK, mode=Mode.SUBTRACT)

    # 草图34 → 切除-拉伸14 (cut, two sides: drawn at the far end of the back side and taken through both)
    with BuildSketch(Plane.XY.offset(-CUT_EXTRUDE_14_DEPTH_BACK)):
        with Locations((104.829314926, -9.366190691)):
            Rectangle(SKETCH_34_W, SKETCH_34_H)
    extrude(amount=CUT_EXTRUDE_14_DEPTH + CUT_EXTRUDE_14_DEPTH_BACK, mode=Mode.SUBTRACT)


solid = part.part
